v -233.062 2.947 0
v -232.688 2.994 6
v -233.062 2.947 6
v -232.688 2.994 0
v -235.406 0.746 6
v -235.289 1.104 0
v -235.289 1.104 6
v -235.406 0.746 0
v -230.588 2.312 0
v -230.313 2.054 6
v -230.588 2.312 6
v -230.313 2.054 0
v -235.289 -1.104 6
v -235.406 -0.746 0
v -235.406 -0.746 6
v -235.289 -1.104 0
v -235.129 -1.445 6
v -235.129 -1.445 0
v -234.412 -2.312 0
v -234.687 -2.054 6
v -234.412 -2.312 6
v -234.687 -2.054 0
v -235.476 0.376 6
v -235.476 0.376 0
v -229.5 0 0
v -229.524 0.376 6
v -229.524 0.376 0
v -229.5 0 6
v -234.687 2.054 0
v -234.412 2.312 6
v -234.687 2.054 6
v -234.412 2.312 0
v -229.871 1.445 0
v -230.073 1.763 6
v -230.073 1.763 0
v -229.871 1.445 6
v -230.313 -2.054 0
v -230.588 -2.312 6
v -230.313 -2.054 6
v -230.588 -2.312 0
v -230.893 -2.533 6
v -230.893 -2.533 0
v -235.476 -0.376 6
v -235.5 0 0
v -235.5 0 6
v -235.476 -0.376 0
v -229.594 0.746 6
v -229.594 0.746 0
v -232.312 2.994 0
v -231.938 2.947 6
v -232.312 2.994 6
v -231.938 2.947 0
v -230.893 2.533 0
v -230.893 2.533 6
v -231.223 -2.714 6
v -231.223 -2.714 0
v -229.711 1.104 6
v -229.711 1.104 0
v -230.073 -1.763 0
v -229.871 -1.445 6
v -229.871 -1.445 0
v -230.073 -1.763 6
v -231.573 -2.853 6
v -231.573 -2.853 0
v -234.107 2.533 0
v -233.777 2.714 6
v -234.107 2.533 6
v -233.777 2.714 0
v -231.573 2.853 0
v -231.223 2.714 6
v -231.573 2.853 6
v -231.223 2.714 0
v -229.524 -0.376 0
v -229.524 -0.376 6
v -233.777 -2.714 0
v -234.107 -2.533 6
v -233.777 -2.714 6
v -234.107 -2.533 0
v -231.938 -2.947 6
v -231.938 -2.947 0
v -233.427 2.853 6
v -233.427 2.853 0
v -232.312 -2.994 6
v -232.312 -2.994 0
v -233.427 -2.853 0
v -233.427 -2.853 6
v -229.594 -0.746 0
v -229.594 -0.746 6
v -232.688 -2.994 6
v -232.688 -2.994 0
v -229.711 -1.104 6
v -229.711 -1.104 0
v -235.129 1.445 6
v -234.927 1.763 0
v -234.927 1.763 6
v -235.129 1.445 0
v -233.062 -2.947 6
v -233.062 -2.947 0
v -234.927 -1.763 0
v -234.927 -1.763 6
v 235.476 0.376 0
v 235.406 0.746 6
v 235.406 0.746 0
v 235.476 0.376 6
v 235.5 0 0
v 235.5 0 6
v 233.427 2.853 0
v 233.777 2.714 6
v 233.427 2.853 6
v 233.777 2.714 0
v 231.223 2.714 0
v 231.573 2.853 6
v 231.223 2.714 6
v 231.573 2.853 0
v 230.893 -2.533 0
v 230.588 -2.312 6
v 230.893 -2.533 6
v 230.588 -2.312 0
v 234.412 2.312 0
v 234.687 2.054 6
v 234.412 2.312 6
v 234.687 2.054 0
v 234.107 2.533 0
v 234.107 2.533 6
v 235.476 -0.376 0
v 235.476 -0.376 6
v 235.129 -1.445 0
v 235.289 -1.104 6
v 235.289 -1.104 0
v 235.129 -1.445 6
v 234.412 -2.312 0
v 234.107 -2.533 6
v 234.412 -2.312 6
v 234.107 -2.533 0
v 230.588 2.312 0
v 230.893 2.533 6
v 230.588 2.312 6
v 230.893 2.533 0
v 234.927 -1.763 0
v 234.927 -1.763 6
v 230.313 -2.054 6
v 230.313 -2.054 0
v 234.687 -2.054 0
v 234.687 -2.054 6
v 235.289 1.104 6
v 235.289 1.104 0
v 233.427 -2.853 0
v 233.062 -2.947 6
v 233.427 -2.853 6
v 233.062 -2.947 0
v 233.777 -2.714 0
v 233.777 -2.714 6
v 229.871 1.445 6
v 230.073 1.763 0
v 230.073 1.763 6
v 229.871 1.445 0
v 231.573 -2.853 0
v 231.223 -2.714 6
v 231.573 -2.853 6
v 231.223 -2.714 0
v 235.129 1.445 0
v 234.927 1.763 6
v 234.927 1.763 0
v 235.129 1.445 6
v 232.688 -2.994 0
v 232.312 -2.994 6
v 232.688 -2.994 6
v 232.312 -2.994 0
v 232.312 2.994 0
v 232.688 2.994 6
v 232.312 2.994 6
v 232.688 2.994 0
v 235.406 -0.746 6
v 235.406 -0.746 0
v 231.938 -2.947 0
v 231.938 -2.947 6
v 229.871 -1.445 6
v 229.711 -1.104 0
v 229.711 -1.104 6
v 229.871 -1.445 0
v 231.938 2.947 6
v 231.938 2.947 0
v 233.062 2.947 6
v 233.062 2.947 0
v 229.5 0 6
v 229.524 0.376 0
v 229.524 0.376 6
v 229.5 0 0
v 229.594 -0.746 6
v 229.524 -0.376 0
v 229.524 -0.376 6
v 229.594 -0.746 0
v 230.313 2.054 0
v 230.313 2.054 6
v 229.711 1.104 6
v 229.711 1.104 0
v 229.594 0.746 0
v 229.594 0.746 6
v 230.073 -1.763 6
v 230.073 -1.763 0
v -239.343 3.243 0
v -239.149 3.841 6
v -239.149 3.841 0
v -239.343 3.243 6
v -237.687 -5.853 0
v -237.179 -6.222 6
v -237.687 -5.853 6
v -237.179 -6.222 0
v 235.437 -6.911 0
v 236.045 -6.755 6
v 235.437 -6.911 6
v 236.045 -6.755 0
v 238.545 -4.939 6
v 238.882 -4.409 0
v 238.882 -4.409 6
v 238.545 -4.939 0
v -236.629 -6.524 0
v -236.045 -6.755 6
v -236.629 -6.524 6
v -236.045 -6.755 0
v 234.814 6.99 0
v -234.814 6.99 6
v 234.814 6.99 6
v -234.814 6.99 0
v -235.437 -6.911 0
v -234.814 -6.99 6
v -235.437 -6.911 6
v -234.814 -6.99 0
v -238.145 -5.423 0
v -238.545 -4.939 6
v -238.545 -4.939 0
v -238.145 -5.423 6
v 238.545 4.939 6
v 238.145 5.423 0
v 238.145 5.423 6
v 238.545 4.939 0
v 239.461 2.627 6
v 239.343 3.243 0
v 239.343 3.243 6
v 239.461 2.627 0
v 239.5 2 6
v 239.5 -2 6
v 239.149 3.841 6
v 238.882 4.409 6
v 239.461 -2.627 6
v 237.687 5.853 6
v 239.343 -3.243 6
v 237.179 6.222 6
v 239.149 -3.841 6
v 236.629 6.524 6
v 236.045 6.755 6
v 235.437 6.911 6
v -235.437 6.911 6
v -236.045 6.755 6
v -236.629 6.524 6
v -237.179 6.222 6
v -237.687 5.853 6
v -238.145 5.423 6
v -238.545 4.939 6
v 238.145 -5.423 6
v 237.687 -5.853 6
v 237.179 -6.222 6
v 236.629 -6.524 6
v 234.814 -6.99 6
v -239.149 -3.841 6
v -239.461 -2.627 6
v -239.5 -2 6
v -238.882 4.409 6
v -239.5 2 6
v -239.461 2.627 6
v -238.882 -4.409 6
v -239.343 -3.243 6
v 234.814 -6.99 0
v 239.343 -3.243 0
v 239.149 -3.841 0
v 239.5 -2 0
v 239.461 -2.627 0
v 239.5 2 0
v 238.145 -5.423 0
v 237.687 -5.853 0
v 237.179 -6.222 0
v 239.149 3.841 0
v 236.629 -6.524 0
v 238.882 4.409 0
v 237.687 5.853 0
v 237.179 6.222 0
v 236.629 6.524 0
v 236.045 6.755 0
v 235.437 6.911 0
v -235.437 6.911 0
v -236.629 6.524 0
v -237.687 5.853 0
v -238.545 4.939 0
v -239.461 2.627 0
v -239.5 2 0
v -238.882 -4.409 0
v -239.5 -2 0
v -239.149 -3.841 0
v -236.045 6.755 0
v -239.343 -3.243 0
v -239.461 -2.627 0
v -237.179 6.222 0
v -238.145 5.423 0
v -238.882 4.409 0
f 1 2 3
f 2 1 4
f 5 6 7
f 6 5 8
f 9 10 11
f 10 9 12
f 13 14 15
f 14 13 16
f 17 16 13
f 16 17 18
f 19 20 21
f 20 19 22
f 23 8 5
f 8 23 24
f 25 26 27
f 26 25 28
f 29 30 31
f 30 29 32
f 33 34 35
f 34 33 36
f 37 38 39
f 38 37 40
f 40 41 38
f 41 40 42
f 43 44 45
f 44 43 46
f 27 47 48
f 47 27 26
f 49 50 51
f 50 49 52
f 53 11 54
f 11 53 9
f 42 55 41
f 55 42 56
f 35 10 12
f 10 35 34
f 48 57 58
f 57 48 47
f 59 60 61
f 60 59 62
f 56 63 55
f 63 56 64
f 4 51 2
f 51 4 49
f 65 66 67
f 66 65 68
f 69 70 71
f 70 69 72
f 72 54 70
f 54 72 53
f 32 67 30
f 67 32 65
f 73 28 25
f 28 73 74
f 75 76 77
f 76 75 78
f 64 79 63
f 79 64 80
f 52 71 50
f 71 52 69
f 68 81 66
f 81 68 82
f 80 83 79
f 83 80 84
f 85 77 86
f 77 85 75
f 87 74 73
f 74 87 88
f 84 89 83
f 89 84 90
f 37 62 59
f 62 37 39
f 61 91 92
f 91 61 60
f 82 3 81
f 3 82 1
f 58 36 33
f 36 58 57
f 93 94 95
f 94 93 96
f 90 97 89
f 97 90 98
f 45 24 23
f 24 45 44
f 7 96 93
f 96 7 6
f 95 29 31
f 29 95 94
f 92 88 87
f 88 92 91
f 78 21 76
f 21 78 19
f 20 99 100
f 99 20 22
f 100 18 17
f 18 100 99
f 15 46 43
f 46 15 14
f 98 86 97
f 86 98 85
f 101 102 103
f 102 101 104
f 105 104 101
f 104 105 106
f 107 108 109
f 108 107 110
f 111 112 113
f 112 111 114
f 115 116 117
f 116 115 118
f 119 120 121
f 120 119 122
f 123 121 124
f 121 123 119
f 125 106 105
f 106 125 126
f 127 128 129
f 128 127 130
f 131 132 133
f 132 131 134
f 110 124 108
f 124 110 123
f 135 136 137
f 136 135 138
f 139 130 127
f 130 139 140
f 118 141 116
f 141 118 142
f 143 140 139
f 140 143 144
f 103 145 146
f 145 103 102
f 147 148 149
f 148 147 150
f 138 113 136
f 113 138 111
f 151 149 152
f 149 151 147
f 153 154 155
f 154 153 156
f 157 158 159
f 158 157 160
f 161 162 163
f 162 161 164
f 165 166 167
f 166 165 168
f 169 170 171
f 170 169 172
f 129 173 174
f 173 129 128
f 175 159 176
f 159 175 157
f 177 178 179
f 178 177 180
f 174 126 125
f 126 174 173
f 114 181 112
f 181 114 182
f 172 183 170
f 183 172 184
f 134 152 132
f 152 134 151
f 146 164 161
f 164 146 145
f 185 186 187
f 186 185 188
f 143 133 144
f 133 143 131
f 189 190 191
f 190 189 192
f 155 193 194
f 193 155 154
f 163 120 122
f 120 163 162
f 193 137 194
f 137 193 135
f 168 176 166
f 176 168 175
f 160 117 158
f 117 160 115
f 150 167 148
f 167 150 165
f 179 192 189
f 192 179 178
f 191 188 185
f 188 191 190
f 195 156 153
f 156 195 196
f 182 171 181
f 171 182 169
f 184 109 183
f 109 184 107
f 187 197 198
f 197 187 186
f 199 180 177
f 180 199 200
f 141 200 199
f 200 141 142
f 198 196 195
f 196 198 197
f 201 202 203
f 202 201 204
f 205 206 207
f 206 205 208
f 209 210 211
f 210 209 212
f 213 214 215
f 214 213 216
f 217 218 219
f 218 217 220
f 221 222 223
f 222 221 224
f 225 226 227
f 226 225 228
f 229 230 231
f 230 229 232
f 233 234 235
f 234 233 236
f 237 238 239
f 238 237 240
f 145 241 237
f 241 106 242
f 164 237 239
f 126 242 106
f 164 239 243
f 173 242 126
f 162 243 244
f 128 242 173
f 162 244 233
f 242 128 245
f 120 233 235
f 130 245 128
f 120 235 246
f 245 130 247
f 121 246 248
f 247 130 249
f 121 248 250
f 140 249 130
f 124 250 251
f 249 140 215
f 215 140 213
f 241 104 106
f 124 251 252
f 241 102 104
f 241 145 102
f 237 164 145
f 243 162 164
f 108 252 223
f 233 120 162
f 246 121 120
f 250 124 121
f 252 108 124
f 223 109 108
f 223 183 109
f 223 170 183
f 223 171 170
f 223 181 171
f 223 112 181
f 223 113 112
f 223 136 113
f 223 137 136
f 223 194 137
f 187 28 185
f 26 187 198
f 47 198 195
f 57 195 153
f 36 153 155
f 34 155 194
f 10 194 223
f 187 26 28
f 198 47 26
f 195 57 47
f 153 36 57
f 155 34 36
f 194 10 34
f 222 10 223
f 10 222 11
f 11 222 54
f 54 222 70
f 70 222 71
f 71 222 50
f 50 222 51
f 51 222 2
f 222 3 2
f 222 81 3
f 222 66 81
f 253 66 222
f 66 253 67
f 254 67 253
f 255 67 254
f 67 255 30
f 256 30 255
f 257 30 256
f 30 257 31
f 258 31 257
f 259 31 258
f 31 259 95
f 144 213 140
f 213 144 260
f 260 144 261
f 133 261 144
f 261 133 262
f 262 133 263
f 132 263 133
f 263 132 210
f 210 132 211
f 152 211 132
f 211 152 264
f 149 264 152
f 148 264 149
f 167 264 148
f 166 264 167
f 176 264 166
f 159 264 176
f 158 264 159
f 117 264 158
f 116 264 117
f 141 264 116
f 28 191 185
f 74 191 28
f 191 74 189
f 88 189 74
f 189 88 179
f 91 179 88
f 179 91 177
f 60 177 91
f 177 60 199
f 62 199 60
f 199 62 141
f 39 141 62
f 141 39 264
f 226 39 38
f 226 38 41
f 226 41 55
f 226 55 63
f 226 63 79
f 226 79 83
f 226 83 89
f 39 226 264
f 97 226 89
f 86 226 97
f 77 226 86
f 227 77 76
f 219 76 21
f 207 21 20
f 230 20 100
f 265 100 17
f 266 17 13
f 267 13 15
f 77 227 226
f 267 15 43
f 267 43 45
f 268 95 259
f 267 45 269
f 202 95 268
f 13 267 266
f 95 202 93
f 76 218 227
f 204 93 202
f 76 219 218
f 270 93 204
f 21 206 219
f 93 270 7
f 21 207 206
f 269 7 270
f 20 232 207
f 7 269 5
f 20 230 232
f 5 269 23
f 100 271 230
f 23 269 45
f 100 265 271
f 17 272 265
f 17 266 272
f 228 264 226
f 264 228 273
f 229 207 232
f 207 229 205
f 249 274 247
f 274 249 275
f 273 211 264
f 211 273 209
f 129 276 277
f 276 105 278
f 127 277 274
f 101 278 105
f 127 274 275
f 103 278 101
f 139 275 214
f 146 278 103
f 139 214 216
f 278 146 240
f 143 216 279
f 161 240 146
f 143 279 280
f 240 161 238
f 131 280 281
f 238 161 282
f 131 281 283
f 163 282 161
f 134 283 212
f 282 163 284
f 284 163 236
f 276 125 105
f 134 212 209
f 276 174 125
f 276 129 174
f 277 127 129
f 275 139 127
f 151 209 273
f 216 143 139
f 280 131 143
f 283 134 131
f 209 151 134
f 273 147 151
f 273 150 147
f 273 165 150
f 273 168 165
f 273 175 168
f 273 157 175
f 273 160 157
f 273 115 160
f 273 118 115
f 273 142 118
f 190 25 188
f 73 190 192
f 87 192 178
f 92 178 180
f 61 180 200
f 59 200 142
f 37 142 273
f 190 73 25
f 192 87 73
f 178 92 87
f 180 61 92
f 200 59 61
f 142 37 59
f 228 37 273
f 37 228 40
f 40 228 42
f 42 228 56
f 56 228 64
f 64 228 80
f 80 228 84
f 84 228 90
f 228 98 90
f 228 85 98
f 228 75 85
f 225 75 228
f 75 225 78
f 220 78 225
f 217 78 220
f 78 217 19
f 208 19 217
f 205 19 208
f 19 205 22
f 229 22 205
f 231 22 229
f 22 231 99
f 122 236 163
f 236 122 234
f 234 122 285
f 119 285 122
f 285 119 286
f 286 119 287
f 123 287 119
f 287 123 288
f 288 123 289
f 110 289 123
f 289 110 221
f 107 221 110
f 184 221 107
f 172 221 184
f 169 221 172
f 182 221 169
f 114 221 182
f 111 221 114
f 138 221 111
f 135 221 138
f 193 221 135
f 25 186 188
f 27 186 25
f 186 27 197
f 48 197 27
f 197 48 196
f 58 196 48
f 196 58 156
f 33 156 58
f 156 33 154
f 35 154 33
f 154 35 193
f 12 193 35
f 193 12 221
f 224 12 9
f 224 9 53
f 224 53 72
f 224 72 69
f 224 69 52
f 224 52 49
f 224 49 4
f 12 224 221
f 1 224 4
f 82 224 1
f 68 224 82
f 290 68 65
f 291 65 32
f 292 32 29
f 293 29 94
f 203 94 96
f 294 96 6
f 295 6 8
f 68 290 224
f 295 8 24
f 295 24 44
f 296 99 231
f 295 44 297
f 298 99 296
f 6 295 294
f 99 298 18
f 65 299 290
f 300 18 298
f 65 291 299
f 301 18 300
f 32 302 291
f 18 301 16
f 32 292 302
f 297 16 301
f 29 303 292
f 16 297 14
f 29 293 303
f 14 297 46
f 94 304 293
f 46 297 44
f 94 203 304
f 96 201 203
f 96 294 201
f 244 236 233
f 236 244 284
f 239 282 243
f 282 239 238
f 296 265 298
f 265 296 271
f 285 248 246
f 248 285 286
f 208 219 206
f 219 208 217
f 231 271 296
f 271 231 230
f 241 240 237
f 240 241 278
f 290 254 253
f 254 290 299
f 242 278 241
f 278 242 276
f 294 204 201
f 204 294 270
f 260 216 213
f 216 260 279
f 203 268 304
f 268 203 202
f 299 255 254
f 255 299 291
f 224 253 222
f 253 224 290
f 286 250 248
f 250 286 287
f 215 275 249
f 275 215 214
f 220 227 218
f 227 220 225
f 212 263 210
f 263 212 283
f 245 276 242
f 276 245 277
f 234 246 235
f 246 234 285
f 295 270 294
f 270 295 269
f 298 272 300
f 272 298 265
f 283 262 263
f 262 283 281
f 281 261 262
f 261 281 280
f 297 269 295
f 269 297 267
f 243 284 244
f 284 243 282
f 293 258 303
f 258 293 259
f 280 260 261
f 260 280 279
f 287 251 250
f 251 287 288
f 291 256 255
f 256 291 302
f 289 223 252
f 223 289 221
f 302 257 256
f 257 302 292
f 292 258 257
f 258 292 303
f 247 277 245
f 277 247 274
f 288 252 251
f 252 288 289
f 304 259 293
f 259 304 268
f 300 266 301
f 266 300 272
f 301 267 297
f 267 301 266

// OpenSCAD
$fn = 50;


difference() {
	union() {
		hull() {
			translate(v = [-234.5000000000, 2.0000000000, 0]) {
				cylinder(h = 6, r = 5);
			}
			translate(v = [234.5000000000, 2.0000000000, 0]) {
				cylinder(h = 6, r = 5);
			}
			translate(v = [-234.5000000000, -2.0000000000, 0]) {
				cylinder(h = 6, r = 5);
			}
			translate(v = [234.5000000000, -2.0000000000, 0]) {
				cylinder(h = 6, r = 5);
			}
		}
	}
	union() {
		translate(v = [-232.5000000000, 0.0000000000, -100.0000000000]) {
			cylinder(h = 200, r = 3.0000000000);
		}
		translate(v = [-232.5000000000, 0.0000000000, -100.0000000000]) {
			cylinder(h = 200, r = 3.0000000000);
		}
		translate(v = [232.5000000000, 0.0000000000, -100.0000000000]) {
			cylinder(h = 200, r = 3.0000000000);
		}
		translate(v = [232.5000000000, 0.0000000000, -100.0000000000]) {
			cylinder(h = 200, r = 3.0000000000);
		}
	}
}
